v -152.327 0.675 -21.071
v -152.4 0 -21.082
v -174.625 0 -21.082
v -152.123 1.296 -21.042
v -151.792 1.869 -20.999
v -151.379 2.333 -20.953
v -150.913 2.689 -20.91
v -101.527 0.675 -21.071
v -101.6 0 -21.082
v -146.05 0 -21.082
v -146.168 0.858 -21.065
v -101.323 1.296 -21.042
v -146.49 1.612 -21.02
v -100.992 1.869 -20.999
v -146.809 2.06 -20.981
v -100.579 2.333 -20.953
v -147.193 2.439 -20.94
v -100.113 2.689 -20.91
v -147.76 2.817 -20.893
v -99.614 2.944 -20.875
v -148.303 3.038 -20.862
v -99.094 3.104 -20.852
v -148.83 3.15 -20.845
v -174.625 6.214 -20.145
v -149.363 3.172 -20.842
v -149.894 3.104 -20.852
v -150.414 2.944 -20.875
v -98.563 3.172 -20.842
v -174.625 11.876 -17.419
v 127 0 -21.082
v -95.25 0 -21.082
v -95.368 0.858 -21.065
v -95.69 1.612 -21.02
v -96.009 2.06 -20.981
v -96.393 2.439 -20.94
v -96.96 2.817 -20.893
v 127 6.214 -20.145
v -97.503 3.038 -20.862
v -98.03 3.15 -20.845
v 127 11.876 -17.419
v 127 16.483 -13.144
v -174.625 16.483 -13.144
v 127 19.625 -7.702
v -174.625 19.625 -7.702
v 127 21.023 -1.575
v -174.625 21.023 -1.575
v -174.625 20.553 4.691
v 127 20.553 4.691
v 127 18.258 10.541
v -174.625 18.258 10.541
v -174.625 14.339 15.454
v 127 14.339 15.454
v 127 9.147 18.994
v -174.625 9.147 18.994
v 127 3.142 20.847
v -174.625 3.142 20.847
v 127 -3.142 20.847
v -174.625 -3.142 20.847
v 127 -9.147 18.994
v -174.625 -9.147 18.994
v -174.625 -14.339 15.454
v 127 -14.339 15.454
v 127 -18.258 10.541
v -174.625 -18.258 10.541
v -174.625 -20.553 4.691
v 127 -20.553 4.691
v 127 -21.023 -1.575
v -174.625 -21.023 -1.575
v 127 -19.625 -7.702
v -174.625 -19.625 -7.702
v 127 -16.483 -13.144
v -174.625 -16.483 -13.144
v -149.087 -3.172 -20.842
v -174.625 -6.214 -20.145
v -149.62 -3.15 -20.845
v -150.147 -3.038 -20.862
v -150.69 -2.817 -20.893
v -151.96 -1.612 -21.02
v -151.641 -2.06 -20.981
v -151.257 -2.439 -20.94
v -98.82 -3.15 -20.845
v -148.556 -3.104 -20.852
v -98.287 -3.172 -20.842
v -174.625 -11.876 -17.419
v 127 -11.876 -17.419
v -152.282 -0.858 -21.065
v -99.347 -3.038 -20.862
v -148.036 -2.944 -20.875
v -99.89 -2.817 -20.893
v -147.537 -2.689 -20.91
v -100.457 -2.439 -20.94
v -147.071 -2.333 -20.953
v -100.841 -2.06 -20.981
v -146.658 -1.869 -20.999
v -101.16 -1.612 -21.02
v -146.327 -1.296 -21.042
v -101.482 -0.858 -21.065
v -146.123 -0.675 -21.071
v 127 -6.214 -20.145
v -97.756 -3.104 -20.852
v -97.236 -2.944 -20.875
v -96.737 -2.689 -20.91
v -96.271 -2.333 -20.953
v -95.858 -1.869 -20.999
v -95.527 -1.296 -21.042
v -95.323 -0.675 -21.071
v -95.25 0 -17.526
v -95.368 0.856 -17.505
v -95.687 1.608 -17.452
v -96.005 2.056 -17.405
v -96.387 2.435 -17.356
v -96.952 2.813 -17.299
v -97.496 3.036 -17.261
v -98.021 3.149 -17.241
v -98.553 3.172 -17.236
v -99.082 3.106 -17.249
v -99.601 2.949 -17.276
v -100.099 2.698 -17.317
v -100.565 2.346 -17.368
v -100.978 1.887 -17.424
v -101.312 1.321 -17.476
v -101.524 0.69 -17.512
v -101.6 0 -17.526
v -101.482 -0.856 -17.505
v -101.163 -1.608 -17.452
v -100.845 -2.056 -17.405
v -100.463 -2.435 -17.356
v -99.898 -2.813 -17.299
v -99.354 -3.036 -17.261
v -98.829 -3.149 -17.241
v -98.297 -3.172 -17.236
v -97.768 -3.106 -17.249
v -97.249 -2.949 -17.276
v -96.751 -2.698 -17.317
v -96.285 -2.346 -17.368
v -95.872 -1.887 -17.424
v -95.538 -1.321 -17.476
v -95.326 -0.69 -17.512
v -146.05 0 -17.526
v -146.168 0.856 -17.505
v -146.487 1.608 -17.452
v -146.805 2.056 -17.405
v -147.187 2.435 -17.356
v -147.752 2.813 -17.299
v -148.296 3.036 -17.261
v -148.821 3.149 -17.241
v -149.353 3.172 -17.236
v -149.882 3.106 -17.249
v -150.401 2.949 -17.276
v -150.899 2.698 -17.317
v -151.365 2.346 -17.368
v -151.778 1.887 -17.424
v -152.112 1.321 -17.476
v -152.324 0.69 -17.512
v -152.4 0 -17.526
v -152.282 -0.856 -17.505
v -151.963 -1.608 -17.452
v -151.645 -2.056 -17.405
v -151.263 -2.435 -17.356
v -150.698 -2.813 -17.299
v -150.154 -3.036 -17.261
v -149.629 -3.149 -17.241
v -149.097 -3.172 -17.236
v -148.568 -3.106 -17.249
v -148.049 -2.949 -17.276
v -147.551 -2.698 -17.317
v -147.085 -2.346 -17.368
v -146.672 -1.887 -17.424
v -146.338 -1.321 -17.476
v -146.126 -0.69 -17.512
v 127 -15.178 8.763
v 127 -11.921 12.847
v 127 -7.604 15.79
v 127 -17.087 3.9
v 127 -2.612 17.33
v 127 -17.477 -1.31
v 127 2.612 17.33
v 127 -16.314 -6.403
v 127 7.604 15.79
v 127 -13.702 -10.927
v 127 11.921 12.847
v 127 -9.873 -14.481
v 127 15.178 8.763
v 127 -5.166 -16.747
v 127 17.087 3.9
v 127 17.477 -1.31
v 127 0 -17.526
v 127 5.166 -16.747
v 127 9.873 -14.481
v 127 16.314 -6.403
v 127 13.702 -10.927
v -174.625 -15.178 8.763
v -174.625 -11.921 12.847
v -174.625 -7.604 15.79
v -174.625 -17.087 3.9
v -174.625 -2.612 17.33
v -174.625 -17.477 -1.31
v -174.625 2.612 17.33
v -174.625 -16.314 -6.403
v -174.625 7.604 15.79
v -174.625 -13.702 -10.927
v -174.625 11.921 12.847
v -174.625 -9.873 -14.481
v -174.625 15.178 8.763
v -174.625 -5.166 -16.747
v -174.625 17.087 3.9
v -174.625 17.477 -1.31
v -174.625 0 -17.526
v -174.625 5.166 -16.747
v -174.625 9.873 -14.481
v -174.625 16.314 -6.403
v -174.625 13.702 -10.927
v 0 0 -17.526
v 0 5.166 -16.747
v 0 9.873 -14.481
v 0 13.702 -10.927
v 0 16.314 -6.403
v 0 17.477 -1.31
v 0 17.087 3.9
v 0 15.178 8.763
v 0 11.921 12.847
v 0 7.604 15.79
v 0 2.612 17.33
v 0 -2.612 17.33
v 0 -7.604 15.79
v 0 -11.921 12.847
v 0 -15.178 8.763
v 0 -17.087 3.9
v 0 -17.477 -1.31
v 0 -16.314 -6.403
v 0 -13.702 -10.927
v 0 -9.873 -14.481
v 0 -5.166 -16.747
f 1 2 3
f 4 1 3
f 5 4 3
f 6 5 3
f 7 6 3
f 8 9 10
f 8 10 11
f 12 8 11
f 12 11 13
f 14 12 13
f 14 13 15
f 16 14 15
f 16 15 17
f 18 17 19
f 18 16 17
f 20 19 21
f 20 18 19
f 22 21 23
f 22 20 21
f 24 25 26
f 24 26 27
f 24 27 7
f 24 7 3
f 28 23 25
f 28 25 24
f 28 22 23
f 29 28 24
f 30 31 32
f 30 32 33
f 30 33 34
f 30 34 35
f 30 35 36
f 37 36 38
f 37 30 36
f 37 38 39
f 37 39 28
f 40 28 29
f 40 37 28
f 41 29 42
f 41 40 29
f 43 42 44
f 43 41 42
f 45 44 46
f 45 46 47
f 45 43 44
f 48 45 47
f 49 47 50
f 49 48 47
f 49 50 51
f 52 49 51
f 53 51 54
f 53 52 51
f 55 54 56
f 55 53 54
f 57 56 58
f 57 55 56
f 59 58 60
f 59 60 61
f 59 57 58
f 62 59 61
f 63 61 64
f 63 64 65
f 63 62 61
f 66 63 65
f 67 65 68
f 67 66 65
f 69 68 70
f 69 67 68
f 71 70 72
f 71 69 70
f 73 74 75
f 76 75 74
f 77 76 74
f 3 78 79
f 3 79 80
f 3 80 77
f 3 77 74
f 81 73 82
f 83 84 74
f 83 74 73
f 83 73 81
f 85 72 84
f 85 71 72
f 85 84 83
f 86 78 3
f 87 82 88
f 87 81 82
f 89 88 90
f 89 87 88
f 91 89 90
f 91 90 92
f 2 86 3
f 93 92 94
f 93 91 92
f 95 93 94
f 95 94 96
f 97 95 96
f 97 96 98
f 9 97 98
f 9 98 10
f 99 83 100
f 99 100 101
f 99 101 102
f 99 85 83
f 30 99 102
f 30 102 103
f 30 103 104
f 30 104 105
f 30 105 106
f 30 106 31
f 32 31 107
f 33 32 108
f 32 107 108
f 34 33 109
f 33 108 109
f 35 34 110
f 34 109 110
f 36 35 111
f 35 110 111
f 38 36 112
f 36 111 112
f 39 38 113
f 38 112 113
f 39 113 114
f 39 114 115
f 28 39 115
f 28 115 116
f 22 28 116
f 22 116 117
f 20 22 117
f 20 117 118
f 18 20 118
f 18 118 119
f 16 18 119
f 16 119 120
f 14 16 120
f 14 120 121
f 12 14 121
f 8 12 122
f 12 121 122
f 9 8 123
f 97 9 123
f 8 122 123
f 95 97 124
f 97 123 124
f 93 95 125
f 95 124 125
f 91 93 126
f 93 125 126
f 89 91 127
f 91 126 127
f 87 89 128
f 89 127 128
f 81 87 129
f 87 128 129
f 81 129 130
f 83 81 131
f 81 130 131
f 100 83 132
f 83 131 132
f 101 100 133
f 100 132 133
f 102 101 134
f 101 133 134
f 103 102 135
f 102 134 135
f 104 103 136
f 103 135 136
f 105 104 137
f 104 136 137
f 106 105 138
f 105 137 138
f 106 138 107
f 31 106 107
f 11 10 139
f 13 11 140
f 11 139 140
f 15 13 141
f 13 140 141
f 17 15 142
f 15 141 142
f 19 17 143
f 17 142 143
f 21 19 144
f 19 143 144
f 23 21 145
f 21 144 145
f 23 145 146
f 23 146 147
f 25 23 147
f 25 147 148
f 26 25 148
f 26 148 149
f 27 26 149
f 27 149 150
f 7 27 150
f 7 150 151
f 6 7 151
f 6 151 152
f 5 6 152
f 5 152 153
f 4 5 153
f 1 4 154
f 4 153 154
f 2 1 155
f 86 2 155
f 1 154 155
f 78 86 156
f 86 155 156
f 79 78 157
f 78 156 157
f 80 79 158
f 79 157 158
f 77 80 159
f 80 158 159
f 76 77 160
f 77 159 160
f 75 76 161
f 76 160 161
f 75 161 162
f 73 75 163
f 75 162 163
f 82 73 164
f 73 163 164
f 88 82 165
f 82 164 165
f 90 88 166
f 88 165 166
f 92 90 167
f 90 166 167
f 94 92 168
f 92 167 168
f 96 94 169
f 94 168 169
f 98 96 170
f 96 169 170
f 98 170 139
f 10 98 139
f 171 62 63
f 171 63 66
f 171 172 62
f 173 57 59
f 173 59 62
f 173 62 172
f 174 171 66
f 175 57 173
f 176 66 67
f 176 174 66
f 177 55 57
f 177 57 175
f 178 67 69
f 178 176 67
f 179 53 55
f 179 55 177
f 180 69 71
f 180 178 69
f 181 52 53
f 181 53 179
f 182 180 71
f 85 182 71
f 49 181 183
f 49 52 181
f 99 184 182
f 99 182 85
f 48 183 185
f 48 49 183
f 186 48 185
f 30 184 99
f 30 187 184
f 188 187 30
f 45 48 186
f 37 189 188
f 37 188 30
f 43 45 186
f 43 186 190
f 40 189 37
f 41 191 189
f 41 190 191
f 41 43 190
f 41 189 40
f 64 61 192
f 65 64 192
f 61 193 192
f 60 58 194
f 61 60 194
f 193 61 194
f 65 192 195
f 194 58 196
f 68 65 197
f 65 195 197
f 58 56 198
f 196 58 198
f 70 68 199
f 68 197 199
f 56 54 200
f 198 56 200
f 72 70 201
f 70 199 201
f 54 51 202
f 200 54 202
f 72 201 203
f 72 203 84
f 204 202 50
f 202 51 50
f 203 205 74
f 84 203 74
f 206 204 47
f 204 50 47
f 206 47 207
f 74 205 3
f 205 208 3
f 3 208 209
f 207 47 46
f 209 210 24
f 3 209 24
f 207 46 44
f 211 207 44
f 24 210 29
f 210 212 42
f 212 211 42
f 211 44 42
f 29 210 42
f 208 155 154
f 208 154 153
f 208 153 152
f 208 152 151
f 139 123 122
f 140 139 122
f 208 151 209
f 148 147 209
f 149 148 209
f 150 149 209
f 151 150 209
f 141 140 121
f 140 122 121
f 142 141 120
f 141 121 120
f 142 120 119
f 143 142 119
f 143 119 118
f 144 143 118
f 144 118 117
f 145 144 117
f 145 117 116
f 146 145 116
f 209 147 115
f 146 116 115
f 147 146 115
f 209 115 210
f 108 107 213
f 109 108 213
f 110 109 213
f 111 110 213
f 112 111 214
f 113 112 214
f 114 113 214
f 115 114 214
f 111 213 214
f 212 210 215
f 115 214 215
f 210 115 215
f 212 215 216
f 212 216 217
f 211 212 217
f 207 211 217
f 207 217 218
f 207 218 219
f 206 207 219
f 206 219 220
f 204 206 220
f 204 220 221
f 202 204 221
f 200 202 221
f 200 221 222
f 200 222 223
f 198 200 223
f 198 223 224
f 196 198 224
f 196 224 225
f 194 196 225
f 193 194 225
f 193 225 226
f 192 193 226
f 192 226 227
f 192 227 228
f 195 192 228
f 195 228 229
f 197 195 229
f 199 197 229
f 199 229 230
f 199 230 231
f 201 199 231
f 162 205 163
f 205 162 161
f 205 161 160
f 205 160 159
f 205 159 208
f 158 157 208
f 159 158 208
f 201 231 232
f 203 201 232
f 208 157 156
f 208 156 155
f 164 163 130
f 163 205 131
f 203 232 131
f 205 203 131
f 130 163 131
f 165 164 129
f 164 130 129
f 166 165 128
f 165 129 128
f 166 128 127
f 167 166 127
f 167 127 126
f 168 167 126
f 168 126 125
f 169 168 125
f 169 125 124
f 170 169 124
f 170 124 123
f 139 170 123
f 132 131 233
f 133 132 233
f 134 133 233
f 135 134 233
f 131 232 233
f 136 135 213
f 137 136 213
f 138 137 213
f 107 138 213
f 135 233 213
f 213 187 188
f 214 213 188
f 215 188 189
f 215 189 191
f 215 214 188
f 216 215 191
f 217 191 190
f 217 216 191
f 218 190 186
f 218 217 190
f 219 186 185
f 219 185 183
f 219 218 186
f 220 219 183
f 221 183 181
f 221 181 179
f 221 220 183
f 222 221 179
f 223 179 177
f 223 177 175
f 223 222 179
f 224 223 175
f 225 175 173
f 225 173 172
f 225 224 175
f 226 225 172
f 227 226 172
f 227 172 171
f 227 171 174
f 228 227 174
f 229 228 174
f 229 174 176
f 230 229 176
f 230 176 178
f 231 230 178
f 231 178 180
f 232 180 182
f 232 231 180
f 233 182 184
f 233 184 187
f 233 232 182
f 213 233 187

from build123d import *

# Parameters (mm, degrees)
SKETCH1_R                = 21.082
SKETCH1_R_2              = 17.526
BOSS_EXTRUDE1_DEPTH      = 127
BOSS_EXTRUDE1_DEPTH_BACK = 174.625
SKETCH2_R                = 3.175
CUT_EXTRUDE1_DEPTH       = 22.082


with BuildPart() as part:
    # Sketch1 → Boss-Extrude1 (new body, two sides)
    with BuildSketch(Plane(origin=(0, 0, 0), x_dir=(0, 0, -1), z_dir=(1, 0, 0))) as boss_extrude1_sk:
        Circle(SKETCH1_R)
        Circle(SKETCH1_R_2, mode=Mode.SUBTRACT)
    extrude(amount=BOSS_EXTRUDE1_DEPTH)
    extrude(boss_extrude1_sk.sketch, amount=-BOSS_EXTRUDE1_DEPTH_BACK)

    # Sketch2 → Cut-Extrude1 (cut, through all)
    with BuildSketch(Plane.XY):
        with Locations((-98.425, 0)):
            Circle(SKETCH2_R)
        with Locations((-149.225, 0)):
            Circle(SKETCH2_R)
    extrude(amount=-CUT_EXTRUDE1_DEPTH, mode=Mode.SUBTRACT)


solid = part.part
